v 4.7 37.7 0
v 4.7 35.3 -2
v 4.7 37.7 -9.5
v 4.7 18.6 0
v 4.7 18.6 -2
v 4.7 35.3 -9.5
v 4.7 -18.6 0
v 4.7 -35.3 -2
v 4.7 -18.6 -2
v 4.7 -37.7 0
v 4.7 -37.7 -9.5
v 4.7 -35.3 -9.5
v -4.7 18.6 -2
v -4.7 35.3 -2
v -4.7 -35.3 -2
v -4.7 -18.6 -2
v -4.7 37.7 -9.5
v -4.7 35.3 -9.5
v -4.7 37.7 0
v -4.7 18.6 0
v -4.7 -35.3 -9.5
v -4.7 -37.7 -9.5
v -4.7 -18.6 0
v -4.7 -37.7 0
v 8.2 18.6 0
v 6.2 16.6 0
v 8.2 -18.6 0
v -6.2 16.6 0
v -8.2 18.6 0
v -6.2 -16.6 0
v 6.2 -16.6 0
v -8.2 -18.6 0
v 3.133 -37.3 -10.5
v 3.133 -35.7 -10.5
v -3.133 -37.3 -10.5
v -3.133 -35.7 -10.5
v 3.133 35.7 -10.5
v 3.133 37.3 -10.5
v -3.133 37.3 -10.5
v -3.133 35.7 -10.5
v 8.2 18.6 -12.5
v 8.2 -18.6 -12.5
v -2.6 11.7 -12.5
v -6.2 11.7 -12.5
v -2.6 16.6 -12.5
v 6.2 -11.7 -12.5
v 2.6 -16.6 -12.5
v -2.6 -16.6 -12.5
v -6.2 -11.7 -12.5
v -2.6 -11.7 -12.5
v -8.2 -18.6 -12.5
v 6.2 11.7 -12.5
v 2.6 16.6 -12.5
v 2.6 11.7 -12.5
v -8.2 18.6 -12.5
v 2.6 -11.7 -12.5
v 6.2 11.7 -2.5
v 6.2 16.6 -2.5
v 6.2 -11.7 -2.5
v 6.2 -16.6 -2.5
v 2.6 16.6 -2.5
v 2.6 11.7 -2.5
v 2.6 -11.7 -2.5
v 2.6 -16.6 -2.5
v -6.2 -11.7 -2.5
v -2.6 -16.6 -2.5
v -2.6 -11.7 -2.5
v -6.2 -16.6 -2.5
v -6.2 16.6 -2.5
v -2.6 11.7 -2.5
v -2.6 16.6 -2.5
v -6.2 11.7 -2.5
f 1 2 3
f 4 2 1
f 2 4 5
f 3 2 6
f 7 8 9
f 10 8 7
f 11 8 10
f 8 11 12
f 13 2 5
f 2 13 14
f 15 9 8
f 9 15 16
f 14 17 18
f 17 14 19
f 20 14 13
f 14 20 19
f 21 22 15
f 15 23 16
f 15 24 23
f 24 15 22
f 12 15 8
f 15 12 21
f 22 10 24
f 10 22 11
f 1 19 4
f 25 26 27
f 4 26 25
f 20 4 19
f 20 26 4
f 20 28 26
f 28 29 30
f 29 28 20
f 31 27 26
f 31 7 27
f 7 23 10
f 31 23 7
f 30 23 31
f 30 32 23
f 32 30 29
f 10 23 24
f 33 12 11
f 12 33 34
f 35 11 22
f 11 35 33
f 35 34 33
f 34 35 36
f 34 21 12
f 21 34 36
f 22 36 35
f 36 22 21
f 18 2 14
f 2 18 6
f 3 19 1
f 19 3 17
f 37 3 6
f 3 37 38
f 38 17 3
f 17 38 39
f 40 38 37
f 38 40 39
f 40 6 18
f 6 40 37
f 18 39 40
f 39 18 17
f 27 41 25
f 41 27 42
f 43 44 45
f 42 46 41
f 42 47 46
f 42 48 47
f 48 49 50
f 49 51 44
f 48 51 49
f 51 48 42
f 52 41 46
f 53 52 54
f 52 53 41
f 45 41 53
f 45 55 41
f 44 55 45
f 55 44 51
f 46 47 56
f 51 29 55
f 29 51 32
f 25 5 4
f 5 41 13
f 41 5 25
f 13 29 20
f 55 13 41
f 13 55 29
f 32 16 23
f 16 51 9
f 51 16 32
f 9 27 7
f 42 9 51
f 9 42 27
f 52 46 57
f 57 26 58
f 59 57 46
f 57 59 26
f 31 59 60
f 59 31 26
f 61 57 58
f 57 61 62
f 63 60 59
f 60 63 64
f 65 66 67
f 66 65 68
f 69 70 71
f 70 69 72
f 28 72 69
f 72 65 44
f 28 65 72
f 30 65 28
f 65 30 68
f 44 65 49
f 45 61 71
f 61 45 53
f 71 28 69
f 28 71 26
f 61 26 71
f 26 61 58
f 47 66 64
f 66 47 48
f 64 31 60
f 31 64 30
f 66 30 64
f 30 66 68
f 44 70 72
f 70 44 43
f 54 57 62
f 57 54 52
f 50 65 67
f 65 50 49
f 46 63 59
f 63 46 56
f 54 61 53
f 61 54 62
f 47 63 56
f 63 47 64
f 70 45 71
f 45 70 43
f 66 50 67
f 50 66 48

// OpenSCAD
// file: addon_support.scad
iw = 10;  // inner width
it = 3;   // inner thickness
h = 5;    // height
wt = 2;   // wall thickness
m = 0.30; // margin

module addon_holder() {
    module reinforcement() {
        rotate(90, [0, 0, 1])
        rotate(90, [1, 0, 0])
        linear_extrude(height=wt)
        polygon([
            [0, 0],
            [it+wt, 0],
            [0, -h]
        ]);
    }
    
    color("yellow") translate([-wt-iw/2, 0, -h]) {
        difference() {
            cube([iw+2*wt, it+wt, h]);
            translate([wt, -1, -1]) cube([iw, it+1, h+2]);
        }
        reinforcement();
        translate([iw+wt, 0, 0]) reinforcement();
    }
}

module addon_clip(bar_length=0) {
    ch = 1.5*h;
    
    color("#fcc705") {
        translate([-(iw-2*m)/2, m, -ch])
        cube([iw-2*m, it-2*m, ch]);
        
        translate([-(iw-2*m)/2, m, 0])
        cube([iw-2*m, it+wt-m, wt]);
    
        translate([0, (it-2*m)/2+m, -ch-1])
        resize([iw-2*m, it-2*m, 1])
        rotate(45, [0, 0, 1])
        cylinder(h=1, r1=it/3, r2=it/2, $fn=4);
    }
}

module addon_bar(width, single_clip=false) {
    addon_clip();
    if(!single_clip) {
        translate([0, width, 0]) mirror([0, 1, 0]) addon_clip();
    }
    
    color("orange")
    translate([-(iw-2*m)/2, it+wt, 0])
    cube([iw-2*m, width-2*(it+wt), wt]);
}

addon_holder();
//addon_bar(width=15, single_clip=true);
addon_bar(width=20);
// main file
bw = 80;  // base width
wt = 2;   // wall thickness

sw = 12;  // servo width
sl = 23;  // servo length

hl = 32.8; // servo holder length
ht = 2.5;  // servo holder thickness
cw = 4.8;  // cord width
co = 10;   // cord offset from holder

m = 0.20; // margin

use <addon_support.scad>

module addon_servo() {
    w = bw-2*wt;
    
    difference() {
        union() {
            // bar
            translate([0, -w/2, -wt]) addon_bar(w);
            // holder
            color("orange") translate([0, 0, -(ht+co)/2]) cube([sw+2*m+2*wt, hl+2*m+2*wt, ht+co], center=true);
        }
    
        color("orange")  {
            // top hole for holder
            translate([0, 0, 0]) cube([sw+2*m, hl+2*m, 2*ht], center=true);
            // bottom hole for body
            translate([0, 0, -co]) cube([sw+2*m, sl+2*m, 2*co], center=true);
            // cord hole
            translate([0, 0, -co]) cube([cw+2*m, hl+2*m, 2*co], center=true);
        }
    }
}

addon_servo();
